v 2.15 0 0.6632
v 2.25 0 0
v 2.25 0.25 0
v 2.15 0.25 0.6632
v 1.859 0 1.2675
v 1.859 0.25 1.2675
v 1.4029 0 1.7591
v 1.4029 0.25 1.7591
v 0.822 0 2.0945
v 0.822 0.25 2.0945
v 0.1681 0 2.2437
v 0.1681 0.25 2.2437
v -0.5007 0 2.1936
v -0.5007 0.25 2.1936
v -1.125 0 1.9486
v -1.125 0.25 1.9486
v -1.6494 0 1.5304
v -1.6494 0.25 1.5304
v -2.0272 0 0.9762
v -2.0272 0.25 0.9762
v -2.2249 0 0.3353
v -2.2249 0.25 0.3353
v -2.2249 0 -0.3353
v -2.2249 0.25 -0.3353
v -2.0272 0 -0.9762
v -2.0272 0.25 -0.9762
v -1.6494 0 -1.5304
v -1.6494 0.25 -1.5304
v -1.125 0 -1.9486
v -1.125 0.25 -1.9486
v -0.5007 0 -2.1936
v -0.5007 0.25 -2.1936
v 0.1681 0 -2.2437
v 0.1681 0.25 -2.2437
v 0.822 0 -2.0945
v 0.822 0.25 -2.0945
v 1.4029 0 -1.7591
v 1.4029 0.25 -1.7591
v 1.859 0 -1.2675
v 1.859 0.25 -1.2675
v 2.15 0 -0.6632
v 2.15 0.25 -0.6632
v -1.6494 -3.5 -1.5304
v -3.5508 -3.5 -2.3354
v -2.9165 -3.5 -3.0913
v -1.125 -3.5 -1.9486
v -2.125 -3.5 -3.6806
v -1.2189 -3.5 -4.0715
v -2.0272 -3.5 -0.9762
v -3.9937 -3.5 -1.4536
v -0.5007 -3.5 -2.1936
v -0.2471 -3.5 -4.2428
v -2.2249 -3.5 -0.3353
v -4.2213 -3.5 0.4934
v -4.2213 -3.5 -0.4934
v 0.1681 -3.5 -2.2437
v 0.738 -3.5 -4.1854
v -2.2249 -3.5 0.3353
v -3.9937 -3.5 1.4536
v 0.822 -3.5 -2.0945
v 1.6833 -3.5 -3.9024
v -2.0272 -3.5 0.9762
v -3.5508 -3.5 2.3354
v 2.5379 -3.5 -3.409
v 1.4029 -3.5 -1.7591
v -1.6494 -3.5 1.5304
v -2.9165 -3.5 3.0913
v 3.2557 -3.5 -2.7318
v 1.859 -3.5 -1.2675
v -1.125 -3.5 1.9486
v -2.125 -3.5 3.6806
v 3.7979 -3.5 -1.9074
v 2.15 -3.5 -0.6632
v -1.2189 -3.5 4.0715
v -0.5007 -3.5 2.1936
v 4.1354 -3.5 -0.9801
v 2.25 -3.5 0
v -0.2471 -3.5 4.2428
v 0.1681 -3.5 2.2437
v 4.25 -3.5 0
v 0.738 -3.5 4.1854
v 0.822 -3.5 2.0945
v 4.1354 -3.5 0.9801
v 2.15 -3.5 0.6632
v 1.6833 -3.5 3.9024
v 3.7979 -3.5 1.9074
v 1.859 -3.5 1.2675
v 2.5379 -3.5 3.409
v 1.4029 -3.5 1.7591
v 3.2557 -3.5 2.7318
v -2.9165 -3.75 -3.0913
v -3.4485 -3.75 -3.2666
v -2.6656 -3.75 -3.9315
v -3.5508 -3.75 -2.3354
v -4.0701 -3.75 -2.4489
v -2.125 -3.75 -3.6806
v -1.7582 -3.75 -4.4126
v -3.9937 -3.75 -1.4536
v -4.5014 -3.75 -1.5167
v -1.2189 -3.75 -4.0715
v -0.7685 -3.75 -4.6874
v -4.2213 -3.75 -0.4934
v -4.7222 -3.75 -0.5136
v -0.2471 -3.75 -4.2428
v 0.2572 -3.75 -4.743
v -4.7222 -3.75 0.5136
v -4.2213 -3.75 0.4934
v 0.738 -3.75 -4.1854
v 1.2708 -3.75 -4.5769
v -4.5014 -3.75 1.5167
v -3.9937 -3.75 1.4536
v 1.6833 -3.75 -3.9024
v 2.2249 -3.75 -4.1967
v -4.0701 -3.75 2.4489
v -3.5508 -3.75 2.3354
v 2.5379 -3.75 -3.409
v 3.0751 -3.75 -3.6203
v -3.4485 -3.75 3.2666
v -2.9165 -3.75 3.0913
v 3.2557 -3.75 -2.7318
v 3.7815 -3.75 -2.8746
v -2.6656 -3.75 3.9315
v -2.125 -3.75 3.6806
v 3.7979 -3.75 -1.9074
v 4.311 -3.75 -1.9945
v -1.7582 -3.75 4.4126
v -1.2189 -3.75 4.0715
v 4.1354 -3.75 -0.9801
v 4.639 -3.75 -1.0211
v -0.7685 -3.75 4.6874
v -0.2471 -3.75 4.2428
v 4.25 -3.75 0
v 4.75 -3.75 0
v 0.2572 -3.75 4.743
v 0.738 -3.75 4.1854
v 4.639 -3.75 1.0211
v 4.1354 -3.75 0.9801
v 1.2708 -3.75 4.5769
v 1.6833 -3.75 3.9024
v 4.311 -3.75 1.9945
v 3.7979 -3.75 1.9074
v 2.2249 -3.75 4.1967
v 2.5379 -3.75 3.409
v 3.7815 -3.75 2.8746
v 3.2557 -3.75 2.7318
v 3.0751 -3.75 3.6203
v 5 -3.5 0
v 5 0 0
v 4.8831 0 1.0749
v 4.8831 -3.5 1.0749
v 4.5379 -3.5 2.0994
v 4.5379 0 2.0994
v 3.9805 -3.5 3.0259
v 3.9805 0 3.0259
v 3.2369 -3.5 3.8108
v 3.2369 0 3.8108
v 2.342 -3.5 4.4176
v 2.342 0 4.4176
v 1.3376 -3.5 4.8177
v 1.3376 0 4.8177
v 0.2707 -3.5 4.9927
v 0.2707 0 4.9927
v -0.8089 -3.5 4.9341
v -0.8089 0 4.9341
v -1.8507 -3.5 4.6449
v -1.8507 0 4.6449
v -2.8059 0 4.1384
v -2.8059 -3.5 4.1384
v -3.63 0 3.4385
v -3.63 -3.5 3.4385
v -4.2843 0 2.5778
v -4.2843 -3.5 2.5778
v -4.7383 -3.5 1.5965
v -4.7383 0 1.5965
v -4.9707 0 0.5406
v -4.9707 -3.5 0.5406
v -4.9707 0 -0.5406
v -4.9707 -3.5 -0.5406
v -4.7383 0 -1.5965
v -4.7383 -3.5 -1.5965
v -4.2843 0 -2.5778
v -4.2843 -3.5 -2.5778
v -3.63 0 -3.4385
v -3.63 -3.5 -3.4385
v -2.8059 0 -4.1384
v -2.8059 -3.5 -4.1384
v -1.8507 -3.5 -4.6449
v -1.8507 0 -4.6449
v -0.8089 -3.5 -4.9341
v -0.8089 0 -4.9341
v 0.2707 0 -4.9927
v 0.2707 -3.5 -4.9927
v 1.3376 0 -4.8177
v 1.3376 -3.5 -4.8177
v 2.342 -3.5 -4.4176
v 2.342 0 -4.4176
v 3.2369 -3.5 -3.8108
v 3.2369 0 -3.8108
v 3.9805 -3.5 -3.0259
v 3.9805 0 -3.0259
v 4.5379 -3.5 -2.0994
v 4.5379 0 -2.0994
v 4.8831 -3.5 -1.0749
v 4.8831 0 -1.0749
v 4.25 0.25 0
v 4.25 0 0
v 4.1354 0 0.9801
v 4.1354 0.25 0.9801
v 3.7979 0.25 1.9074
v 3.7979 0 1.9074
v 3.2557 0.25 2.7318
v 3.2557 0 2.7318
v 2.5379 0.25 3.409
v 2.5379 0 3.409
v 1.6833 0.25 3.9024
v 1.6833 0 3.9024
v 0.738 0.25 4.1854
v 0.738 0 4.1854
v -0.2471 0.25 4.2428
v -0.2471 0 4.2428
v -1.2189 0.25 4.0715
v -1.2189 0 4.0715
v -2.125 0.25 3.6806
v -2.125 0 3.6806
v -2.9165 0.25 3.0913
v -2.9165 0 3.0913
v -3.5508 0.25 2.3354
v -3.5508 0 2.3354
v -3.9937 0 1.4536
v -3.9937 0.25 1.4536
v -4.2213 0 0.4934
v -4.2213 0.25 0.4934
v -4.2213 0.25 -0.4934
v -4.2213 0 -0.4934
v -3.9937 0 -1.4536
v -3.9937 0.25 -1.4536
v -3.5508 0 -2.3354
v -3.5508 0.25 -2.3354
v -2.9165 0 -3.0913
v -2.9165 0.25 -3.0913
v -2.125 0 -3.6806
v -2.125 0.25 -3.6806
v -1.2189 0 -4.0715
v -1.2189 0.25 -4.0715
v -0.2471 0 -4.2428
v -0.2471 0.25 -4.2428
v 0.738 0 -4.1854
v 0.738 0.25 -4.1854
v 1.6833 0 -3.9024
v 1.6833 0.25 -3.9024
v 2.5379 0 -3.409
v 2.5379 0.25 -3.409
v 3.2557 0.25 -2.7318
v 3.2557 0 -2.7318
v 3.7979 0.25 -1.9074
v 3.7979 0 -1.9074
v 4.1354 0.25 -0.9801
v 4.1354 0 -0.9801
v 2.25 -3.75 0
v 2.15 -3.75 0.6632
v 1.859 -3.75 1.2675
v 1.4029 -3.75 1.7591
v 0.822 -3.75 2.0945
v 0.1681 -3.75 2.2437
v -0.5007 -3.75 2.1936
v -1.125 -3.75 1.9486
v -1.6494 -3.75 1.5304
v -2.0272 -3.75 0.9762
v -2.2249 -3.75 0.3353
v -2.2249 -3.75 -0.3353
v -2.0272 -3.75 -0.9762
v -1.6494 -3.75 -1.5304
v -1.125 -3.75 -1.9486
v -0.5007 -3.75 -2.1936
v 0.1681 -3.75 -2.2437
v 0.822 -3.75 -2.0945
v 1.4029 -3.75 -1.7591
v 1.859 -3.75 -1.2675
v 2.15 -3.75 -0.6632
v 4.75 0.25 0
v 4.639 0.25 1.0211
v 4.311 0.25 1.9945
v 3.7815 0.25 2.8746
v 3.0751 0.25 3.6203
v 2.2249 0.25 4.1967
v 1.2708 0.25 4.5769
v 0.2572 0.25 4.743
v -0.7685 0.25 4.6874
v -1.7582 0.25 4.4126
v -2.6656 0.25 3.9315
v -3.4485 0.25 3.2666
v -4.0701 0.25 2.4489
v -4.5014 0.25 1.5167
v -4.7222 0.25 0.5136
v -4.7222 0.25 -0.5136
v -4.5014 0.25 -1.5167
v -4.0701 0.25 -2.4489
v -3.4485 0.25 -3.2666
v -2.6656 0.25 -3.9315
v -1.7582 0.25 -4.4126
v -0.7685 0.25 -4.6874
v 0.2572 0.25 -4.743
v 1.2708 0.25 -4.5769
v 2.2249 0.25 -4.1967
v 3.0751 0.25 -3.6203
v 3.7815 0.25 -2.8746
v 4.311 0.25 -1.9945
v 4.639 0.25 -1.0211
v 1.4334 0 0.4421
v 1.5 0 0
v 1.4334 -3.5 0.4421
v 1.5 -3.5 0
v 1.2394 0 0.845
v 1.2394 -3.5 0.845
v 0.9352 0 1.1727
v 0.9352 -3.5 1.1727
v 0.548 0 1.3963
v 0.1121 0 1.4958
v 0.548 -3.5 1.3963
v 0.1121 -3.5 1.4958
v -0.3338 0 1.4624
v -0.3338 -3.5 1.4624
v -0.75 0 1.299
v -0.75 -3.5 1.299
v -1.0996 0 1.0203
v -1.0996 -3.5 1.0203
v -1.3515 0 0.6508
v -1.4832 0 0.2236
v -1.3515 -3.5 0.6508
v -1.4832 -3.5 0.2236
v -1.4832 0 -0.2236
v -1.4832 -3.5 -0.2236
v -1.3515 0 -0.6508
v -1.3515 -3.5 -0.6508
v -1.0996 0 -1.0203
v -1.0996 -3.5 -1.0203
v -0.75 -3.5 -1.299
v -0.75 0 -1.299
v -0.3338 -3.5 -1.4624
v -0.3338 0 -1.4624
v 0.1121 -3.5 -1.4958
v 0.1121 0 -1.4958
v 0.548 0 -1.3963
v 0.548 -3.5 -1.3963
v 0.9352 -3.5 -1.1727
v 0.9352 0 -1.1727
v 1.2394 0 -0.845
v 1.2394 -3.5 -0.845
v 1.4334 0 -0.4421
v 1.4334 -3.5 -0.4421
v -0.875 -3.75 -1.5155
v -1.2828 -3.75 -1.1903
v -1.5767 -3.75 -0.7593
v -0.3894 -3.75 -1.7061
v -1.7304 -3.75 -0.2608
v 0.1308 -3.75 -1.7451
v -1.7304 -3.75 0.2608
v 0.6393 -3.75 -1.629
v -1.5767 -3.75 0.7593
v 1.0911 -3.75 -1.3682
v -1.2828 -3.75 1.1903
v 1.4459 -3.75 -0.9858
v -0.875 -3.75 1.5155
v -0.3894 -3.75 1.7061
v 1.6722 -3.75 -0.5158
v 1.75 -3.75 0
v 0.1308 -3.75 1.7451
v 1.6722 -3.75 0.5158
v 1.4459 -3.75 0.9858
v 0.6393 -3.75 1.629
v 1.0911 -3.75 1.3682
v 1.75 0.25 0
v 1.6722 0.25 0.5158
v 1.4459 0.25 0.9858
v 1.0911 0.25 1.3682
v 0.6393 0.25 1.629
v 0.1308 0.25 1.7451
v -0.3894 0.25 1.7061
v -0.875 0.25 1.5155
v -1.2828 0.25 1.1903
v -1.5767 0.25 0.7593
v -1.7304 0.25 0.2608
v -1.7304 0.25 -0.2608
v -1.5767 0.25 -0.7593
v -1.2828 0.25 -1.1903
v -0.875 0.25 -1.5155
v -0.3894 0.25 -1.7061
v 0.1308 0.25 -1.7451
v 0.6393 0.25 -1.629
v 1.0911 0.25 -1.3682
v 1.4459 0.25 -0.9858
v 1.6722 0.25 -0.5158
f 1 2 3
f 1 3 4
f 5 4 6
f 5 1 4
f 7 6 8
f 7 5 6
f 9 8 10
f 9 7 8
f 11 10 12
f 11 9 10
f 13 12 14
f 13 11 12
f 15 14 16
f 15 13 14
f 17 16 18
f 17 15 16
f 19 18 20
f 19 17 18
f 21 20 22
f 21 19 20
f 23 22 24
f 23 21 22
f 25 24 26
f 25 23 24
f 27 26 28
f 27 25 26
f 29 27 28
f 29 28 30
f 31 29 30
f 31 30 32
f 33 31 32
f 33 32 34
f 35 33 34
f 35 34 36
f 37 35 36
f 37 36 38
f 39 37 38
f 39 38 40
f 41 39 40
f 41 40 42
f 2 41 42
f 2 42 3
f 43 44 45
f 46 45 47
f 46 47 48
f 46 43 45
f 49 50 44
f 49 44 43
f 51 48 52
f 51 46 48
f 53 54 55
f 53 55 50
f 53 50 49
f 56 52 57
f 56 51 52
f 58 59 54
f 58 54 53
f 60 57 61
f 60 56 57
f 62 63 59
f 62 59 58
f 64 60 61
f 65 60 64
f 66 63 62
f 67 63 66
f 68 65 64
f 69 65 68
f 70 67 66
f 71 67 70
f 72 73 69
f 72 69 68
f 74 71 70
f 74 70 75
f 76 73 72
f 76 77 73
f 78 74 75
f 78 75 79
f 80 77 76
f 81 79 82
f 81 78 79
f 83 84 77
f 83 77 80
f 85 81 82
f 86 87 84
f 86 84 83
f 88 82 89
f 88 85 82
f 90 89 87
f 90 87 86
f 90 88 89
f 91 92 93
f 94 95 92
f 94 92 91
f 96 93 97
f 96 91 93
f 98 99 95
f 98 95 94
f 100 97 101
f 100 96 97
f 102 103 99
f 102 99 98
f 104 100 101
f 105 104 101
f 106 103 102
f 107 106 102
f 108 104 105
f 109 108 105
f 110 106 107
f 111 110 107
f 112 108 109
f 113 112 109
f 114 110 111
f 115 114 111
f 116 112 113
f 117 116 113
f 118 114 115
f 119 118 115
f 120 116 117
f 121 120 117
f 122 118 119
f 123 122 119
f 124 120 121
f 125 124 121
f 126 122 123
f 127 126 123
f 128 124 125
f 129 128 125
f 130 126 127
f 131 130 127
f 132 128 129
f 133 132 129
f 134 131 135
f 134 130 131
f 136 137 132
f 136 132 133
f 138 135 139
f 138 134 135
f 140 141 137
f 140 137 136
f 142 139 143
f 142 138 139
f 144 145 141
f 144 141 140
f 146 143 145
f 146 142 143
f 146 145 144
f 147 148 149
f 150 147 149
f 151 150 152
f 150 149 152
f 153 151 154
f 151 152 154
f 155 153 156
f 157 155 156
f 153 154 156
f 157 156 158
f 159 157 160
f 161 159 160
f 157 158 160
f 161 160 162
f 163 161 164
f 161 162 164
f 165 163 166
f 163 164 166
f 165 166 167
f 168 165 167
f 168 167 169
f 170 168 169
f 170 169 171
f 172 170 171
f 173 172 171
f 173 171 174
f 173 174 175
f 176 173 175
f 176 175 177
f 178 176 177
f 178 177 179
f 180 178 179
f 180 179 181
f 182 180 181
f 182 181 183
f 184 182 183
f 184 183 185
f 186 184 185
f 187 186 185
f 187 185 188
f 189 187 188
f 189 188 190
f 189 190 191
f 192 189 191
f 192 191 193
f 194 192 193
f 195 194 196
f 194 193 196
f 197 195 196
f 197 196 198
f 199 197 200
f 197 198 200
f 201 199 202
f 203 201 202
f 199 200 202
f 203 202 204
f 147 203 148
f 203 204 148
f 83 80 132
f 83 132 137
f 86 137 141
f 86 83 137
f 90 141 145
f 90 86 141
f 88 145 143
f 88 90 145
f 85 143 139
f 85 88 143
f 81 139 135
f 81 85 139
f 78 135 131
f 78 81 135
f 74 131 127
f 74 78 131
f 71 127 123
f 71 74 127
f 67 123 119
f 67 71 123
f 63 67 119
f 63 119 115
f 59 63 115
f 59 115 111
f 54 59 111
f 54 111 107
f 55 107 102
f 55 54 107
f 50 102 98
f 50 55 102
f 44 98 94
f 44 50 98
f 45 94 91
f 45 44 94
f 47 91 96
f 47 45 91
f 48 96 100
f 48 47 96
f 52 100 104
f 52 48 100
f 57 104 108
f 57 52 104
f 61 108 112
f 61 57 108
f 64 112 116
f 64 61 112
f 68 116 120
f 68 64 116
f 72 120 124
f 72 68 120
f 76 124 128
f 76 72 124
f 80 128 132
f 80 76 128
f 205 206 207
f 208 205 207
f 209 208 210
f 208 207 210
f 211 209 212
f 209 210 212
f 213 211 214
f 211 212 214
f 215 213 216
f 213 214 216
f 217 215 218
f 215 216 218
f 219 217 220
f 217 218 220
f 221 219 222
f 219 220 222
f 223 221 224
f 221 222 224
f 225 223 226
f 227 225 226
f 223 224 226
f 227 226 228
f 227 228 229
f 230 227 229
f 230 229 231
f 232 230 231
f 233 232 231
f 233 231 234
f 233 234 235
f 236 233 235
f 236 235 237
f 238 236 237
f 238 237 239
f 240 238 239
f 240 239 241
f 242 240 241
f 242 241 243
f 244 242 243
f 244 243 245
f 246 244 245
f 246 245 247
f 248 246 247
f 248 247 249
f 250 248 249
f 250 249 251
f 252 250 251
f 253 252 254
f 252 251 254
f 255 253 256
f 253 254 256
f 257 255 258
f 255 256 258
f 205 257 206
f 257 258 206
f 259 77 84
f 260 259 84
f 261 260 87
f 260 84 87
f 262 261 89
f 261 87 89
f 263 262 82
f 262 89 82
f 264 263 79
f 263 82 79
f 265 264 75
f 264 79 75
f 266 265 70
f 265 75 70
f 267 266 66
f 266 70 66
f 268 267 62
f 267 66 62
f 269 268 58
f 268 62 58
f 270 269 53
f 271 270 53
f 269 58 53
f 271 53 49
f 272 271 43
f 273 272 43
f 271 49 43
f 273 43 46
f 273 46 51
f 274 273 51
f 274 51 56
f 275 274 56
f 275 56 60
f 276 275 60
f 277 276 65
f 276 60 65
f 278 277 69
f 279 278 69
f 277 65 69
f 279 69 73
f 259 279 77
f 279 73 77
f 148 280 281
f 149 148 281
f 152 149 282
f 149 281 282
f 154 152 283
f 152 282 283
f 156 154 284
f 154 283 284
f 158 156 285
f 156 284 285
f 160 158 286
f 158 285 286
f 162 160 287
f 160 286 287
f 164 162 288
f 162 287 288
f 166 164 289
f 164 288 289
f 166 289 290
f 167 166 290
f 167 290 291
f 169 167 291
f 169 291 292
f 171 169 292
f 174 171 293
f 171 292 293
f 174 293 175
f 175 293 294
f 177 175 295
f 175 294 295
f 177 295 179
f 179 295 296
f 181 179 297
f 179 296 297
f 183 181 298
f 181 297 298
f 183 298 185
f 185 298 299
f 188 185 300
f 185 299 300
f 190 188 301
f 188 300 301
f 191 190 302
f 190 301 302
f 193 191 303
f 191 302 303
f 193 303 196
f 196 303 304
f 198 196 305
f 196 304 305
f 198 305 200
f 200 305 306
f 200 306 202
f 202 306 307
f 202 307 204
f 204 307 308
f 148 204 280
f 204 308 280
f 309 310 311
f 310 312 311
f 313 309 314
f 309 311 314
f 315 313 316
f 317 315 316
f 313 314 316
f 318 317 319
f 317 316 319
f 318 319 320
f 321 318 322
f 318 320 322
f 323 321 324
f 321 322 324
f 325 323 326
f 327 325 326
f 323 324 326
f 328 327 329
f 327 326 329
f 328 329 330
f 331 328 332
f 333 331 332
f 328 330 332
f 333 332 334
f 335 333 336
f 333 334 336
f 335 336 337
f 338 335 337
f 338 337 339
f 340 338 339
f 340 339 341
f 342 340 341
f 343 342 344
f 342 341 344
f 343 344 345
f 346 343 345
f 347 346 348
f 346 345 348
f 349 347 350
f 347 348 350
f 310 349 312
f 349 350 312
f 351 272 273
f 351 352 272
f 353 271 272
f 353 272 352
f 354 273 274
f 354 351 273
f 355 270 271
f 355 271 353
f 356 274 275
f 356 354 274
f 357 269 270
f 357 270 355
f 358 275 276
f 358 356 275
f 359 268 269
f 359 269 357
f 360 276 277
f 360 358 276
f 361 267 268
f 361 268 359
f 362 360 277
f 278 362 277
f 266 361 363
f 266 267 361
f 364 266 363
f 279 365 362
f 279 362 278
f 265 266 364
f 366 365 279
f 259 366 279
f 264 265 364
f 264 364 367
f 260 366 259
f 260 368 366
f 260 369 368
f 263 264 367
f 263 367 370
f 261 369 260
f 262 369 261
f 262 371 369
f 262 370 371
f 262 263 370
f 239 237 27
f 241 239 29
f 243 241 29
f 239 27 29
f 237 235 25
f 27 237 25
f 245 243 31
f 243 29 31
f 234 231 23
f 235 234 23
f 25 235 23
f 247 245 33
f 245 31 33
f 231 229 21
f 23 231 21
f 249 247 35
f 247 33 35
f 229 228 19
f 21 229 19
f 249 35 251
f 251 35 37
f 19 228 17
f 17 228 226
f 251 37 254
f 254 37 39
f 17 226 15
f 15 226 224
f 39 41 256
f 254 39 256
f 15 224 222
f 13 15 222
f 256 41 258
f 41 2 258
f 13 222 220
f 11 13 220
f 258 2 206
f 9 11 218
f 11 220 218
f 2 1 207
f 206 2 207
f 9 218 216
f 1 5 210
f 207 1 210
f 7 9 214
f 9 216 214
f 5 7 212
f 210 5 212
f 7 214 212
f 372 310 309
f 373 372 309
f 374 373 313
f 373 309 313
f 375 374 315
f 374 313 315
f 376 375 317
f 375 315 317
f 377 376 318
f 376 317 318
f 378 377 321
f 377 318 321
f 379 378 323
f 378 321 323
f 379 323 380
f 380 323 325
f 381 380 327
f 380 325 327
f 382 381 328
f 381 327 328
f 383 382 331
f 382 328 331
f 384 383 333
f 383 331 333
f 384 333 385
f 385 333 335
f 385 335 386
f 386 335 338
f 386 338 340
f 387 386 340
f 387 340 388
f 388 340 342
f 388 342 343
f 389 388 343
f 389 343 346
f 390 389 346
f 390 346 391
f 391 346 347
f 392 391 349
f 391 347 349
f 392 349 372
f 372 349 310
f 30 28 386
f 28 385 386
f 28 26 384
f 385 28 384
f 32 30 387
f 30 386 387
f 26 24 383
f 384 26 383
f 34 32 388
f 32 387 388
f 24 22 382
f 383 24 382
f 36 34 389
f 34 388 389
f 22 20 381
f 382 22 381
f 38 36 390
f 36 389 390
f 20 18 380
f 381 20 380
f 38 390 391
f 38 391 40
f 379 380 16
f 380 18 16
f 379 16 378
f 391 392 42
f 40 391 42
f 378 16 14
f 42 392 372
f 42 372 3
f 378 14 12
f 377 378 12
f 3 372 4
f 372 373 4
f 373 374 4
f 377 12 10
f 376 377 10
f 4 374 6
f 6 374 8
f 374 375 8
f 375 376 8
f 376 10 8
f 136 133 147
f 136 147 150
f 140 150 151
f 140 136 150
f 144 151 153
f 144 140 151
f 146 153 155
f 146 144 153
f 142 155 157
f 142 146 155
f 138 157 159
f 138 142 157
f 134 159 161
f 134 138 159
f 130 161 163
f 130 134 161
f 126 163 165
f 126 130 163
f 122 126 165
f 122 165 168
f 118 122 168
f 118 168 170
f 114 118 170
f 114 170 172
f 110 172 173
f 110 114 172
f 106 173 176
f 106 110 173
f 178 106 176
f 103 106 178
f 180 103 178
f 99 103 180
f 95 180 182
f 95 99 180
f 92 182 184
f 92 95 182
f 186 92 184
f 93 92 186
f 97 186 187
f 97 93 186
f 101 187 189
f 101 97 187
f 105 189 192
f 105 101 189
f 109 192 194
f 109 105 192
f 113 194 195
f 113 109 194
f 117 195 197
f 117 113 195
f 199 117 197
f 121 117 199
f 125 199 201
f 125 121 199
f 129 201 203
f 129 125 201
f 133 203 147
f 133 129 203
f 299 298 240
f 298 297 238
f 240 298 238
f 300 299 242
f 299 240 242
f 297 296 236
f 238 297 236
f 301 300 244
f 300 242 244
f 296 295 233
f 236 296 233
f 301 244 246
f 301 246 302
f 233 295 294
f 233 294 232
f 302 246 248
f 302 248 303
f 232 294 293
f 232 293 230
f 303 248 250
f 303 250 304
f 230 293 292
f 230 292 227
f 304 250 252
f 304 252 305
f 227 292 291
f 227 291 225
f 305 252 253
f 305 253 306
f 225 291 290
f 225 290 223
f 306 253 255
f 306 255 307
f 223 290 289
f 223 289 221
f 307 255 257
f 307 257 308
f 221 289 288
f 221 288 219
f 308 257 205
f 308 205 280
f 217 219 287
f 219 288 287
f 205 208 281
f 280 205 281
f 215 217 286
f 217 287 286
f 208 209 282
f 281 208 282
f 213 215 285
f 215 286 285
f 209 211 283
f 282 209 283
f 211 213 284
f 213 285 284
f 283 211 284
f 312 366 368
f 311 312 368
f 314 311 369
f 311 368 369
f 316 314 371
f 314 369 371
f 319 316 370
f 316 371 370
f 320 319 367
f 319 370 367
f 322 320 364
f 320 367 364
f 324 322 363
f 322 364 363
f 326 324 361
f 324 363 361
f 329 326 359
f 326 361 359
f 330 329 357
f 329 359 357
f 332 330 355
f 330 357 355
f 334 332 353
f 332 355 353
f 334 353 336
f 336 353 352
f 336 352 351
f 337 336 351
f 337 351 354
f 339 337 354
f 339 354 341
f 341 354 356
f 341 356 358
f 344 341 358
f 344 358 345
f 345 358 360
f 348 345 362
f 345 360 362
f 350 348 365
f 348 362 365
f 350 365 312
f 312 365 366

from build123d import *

# Parameters (mm, degrees)
F0_R          = 5
F0_R_2        = 1.5
F1_DEPTH      = 3.5
F2_R          = 5
F2_R_2        = 4.25
F2_R_3        = 2.25
F2_R_4        = 1.5
F3_DEPTH      = 0.25
F3_DEPTH_BACK = 3.75
F4_SIZE       = 0.24999


# Not quite as in the source:
# - a fillet or chamfer is up to 0.001 mm smaller than in the source, because OpenCascade refuses the exact size


with BuildPart() as f1:
    # F0 (on Front) → F1 (new body)
    with BuildSketch(Plane.XZ):
        Circle(F0_R)
        Circle(F0_R_2, mode=Mode.SUBTRACT)
    extrude(amount=F1_DEPTH)

    # F2 (on face) → F3 (join, two sides)
    with BuildSketch(Plane.XZ.offset(3.5)) as f3_sk:
        Circle(F2_R)
        Circle(F2_R_2, mode=Mode.SUBTRACT)
        Circle(F2_R_3)
        Circle(F2_R_4, mode=Mode.SUBTRACT)
    extrude(amount=F3_DEPTH)
    extrude(f3_sk.sketch, amount=-F3_DEPTH_BACK)

    # F4 (size 0.25 in the source; OpenCascade refuses exactly that, so slightly less here)
    f4_edges = [f1.edges().sort_by_distance(p)[0] for p in [
        (-5, -3.75, 0),
        (-1.5, -3.75, 0),
        (-1.5, 0.25, 0),
        (-5, 0.25, 0),
    ]]
    chamfer(f4_edges, length=F4_SIZE)


solid = f1.part
